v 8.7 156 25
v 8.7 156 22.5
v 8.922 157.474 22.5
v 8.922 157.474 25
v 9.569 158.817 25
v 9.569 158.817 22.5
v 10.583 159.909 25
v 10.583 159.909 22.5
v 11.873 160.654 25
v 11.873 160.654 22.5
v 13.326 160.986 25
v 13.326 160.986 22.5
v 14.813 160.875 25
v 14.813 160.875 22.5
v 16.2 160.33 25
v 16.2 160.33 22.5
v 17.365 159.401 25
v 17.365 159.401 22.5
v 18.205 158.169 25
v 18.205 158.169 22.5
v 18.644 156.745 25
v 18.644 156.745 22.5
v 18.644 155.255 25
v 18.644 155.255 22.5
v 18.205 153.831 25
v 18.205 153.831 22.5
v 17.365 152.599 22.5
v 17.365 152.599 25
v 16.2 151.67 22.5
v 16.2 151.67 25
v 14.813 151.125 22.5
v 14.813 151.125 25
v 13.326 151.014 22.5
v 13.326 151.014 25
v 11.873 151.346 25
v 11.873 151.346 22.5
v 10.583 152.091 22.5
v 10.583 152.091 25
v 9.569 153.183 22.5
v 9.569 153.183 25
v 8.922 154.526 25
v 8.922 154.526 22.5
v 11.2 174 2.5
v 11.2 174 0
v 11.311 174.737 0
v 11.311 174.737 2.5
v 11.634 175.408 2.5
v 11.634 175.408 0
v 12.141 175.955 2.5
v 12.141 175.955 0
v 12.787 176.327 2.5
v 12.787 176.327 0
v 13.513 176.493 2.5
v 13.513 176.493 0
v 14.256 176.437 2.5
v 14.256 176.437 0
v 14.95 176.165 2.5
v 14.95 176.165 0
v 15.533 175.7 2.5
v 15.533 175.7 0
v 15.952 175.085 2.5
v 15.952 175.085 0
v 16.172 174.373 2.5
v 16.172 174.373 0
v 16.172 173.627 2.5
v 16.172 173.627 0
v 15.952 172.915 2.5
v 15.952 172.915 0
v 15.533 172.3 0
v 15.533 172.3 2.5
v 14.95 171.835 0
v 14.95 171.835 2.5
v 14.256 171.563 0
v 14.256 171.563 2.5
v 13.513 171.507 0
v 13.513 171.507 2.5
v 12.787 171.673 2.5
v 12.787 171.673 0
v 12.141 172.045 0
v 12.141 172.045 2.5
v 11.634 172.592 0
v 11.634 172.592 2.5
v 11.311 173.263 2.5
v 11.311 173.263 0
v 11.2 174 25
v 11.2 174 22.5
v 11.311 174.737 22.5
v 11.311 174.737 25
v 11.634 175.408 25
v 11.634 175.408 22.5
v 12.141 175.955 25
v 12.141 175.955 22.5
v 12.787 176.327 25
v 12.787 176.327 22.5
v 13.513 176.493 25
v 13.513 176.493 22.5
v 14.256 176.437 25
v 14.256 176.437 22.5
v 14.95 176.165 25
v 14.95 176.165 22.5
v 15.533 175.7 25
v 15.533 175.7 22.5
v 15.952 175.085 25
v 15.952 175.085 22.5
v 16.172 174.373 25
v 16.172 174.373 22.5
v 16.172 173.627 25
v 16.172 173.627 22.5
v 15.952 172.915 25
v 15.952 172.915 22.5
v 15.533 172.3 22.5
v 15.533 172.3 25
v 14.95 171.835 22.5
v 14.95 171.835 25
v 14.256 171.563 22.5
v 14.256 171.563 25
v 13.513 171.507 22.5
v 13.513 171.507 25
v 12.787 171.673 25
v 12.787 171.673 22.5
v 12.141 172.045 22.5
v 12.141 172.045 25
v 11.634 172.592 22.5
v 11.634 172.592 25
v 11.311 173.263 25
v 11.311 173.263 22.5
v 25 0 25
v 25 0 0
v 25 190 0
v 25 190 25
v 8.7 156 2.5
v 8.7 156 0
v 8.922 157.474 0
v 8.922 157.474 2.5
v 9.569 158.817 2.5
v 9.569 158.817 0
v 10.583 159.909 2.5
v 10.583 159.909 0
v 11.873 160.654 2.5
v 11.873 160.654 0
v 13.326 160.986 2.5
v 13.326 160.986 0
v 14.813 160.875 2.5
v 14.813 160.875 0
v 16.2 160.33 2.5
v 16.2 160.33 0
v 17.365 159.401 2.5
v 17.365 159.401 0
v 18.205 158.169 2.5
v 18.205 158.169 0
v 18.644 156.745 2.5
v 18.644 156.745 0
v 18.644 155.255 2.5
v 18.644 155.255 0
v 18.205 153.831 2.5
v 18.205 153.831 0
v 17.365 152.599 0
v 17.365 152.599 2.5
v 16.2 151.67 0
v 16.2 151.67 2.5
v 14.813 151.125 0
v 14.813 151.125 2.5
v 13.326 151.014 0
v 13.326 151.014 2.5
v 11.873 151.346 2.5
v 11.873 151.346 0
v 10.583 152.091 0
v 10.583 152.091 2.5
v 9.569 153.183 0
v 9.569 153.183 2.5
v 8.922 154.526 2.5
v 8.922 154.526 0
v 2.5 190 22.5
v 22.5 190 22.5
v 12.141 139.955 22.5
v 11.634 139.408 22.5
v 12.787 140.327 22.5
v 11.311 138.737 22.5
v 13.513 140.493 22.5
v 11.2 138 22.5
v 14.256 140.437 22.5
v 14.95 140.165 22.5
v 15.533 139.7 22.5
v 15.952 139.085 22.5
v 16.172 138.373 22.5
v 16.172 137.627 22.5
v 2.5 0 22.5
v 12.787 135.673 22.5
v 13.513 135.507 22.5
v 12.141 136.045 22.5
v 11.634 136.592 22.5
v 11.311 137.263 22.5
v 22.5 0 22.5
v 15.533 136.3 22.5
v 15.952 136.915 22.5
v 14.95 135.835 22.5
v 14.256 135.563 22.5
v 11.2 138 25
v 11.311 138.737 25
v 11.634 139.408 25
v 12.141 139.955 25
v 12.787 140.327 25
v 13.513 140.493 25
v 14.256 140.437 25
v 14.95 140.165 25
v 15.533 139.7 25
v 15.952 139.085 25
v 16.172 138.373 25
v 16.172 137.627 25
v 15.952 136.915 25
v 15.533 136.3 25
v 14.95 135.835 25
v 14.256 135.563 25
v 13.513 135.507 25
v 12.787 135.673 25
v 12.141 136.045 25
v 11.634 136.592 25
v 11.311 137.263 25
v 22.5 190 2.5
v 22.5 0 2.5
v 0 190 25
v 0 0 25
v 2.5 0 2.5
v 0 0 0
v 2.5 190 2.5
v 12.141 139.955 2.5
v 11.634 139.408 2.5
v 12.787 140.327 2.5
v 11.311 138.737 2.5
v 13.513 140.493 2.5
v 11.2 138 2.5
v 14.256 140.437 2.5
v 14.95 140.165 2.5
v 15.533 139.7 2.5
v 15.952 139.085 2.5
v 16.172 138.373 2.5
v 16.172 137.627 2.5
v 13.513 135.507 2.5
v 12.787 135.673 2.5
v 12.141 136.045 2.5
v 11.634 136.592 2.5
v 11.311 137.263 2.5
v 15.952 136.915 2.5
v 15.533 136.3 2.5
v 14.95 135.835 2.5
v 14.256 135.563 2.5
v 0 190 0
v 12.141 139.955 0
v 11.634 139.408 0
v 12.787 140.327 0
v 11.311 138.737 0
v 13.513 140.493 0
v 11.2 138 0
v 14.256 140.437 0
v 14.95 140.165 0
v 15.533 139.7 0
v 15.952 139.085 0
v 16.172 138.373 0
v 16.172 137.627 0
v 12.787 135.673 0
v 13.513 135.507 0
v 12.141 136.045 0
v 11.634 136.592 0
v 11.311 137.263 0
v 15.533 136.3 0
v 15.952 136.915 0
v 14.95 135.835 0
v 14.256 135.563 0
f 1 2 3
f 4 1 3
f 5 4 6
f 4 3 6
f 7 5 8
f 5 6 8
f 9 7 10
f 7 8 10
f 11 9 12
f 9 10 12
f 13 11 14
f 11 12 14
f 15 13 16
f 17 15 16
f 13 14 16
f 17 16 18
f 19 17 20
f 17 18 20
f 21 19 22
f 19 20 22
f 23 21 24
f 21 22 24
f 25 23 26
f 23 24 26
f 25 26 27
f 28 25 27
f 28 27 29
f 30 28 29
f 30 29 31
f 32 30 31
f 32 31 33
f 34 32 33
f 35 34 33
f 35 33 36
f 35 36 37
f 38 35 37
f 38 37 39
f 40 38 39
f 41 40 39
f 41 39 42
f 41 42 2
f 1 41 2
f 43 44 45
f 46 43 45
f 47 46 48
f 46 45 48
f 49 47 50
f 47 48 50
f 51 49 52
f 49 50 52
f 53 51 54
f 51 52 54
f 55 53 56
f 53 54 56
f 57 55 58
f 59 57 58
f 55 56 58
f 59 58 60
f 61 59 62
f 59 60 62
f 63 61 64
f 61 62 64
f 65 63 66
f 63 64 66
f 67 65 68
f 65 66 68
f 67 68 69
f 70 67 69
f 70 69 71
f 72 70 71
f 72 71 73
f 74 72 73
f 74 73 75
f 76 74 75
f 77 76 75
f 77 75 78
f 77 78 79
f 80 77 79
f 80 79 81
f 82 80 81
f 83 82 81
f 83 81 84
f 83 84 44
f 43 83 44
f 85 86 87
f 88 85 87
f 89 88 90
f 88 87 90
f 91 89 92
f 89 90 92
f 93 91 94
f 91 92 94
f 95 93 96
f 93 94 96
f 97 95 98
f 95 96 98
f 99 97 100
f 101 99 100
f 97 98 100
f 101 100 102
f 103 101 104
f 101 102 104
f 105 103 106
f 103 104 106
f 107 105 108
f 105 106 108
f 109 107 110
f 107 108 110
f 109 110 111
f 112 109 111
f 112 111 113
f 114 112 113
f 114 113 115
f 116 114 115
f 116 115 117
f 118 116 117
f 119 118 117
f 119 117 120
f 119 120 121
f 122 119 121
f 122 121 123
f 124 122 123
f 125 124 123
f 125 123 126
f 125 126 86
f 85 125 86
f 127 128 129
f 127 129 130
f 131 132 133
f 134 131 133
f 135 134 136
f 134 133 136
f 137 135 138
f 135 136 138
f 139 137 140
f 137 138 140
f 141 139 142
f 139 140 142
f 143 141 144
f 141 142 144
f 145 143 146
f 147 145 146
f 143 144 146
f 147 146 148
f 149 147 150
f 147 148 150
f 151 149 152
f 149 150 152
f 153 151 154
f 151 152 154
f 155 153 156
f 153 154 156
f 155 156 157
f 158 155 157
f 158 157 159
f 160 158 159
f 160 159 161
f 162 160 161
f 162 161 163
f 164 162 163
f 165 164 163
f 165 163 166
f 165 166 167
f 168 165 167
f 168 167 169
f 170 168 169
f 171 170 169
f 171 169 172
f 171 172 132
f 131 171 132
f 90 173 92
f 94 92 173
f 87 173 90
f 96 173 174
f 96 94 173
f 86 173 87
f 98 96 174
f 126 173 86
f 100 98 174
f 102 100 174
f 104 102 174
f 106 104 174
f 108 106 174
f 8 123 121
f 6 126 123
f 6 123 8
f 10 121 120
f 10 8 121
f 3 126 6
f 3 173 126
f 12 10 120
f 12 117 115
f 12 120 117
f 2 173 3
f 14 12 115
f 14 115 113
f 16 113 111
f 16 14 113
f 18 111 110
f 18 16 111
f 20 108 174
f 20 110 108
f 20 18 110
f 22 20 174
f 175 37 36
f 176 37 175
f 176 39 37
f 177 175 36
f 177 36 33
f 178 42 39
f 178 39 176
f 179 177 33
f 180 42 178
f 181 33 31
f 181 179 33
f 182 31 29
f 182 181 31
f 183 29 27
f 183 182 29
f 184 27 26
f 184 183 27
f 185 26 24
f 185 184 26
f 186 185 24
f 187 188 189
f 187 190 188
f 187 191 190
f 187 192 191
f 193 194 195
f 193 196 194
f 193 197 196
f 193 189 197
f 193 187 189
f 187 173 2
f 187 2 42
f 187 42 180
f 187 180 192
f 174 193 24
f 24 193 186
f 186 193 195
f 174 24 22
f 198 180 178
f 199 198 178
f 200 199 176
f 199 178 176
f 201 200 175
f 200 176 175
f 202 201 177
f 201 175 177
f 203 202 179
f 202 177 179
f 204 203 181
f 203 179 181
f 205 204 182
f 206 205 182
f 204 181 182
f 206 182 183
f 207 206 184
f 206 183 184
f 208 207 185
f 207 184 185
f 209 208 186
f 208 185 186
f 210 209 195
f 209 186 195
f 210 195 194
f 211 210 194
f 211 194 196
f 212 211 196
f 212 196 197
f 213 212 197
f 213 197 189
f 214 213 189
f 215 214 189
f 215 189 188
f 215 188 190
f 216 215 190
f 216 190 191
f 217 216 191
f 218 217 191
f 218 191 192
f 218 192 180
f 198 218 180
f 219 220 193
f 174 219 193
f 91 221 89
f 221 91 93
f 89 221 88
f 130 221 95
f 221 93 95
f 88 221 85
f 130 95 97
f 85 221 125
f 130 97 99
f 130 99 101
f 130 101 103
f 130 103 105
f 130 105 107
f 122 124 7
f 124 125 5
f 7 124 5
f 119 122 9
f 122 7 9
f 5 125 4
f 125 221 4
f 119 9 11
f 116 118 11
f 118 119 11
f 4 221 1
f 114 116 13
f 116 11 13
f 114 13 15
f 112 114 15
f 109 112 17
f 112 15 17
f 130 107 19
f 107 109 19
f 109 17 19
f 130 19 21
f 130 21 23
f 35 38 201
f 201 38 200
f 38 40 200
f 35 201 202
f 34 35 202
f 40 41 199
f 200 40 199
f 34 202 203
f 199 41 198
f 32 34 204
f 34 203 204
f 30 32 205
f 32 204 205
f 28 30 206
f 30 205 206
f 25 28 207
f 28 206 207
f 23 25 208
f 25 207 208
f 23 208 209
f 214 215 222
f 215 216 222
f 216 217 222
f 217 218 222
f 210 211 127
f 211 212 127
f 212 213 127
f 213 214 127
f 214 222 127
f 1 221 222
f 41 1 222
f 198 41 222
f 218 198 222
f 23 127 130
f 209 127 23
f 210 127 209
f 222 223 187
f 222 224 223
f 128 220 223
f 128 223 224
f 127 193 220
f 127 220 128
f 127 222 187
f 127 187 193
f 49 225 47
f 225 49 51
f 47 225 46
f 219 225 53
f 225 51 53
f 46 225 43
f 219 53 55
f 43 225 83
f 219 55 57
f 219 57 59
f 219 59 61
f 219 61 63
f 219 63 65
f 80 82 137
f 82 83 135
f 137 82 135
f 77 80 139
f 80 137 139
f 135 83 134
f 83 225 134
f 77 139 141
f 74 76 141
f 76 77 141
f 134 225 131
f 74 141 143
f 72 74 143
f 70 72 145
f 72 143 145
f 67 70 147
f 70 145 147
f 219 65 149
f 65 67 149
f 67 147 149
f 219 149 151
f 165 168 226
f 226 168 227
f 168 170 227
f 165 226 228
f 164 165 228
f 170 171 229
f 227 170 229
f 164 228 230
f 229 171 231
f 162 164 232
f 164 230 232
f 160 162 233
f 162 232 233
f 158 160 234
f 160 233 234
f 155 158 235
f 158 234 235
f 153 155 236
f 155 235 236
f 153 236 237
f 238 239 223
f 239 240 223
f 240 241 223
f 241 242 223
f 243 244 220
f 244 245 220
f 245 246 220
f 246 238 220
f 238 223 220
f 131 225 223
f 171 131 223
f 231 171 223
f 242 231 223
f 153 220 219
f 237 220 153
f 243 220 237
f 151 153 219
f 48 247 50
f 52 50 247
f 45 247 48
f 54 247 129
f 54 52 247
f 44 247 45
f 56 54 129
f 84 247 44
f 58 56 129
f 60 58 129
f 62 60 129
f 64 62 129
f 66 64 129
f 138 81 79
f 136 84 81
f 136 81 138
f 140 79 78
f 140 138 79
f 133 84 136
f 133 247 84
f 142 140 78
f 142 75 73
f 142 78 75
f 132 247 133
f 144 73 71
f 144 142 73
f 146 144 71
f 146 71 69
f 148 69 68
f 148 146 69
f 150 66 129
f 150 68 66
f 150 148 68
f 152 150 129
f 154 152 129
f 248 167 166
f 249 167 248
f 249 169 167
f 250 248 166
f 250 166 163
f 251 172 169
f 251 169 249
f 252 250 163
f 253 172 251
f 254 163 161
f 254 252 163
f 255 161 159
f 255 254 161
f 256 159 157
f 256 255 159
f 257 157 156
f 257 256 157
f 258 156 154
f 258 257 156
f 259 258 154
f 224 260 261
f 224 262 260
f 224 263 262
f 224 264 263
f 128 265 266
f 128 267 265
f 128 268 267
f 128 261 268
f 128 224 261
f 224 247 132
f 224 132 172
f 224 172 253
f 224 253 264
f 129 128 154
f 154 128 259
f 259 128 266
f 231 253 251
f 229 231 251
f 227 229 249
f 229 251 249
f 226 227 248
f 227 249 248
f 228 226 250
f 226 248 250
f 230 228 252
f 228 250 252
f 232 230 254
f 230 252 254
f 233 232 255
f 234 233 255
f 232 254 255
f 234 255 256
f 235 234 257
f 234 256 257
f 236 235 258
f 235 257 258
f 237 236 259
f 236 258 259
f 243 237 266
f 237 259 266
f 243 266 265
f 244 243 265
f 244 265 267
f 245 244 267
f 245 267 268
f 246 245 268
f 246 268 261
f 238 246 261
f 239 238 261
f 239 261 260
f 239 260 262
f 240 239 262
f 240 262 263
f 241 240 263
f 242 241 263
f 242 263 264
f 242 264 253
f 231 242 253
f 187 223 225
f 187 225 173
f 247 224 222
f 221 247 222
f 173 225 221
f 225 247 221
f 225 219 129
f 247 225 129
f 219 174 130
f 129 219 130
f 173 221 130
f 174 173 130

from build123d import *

# Parameters (mm, degrees)
F0_W     = 25
F0_H     = 25
F1_DEPTH = 190
F2_T     = -2.5
F4_D     = 10
F5_D     = 5


with BuildPart() as f1:
    # F0 (on Front) → F1 (new body)
    with BuildSketch(Plane.XZ):
        with Locations((12.5, 12.5)):
            Rectangle(F0_W, F0_H)
    extrude(amount=-F1_DEPTH)

    # F2
    f2_openings = [f1.faces().sort_by_distance(p)[0] for p in [
        (12.5, 0, 12.5),
        (12.5, 190, 12.5),
    ]]
    offset(amount=F2_T, openings=f2_openings)

    # F4 (through all)
    with Locations(Plane.XY.offset(25)):
        with Locations((13.7, 156)):
            Hole(F4_D / 2)

    # F5 (through all)
    with Locations(Plane.XY.offset(25)):
        with Locations((13.7, 138), (13.7, 174)):
            Hole(F5_D / 2)


solid = f1.part
